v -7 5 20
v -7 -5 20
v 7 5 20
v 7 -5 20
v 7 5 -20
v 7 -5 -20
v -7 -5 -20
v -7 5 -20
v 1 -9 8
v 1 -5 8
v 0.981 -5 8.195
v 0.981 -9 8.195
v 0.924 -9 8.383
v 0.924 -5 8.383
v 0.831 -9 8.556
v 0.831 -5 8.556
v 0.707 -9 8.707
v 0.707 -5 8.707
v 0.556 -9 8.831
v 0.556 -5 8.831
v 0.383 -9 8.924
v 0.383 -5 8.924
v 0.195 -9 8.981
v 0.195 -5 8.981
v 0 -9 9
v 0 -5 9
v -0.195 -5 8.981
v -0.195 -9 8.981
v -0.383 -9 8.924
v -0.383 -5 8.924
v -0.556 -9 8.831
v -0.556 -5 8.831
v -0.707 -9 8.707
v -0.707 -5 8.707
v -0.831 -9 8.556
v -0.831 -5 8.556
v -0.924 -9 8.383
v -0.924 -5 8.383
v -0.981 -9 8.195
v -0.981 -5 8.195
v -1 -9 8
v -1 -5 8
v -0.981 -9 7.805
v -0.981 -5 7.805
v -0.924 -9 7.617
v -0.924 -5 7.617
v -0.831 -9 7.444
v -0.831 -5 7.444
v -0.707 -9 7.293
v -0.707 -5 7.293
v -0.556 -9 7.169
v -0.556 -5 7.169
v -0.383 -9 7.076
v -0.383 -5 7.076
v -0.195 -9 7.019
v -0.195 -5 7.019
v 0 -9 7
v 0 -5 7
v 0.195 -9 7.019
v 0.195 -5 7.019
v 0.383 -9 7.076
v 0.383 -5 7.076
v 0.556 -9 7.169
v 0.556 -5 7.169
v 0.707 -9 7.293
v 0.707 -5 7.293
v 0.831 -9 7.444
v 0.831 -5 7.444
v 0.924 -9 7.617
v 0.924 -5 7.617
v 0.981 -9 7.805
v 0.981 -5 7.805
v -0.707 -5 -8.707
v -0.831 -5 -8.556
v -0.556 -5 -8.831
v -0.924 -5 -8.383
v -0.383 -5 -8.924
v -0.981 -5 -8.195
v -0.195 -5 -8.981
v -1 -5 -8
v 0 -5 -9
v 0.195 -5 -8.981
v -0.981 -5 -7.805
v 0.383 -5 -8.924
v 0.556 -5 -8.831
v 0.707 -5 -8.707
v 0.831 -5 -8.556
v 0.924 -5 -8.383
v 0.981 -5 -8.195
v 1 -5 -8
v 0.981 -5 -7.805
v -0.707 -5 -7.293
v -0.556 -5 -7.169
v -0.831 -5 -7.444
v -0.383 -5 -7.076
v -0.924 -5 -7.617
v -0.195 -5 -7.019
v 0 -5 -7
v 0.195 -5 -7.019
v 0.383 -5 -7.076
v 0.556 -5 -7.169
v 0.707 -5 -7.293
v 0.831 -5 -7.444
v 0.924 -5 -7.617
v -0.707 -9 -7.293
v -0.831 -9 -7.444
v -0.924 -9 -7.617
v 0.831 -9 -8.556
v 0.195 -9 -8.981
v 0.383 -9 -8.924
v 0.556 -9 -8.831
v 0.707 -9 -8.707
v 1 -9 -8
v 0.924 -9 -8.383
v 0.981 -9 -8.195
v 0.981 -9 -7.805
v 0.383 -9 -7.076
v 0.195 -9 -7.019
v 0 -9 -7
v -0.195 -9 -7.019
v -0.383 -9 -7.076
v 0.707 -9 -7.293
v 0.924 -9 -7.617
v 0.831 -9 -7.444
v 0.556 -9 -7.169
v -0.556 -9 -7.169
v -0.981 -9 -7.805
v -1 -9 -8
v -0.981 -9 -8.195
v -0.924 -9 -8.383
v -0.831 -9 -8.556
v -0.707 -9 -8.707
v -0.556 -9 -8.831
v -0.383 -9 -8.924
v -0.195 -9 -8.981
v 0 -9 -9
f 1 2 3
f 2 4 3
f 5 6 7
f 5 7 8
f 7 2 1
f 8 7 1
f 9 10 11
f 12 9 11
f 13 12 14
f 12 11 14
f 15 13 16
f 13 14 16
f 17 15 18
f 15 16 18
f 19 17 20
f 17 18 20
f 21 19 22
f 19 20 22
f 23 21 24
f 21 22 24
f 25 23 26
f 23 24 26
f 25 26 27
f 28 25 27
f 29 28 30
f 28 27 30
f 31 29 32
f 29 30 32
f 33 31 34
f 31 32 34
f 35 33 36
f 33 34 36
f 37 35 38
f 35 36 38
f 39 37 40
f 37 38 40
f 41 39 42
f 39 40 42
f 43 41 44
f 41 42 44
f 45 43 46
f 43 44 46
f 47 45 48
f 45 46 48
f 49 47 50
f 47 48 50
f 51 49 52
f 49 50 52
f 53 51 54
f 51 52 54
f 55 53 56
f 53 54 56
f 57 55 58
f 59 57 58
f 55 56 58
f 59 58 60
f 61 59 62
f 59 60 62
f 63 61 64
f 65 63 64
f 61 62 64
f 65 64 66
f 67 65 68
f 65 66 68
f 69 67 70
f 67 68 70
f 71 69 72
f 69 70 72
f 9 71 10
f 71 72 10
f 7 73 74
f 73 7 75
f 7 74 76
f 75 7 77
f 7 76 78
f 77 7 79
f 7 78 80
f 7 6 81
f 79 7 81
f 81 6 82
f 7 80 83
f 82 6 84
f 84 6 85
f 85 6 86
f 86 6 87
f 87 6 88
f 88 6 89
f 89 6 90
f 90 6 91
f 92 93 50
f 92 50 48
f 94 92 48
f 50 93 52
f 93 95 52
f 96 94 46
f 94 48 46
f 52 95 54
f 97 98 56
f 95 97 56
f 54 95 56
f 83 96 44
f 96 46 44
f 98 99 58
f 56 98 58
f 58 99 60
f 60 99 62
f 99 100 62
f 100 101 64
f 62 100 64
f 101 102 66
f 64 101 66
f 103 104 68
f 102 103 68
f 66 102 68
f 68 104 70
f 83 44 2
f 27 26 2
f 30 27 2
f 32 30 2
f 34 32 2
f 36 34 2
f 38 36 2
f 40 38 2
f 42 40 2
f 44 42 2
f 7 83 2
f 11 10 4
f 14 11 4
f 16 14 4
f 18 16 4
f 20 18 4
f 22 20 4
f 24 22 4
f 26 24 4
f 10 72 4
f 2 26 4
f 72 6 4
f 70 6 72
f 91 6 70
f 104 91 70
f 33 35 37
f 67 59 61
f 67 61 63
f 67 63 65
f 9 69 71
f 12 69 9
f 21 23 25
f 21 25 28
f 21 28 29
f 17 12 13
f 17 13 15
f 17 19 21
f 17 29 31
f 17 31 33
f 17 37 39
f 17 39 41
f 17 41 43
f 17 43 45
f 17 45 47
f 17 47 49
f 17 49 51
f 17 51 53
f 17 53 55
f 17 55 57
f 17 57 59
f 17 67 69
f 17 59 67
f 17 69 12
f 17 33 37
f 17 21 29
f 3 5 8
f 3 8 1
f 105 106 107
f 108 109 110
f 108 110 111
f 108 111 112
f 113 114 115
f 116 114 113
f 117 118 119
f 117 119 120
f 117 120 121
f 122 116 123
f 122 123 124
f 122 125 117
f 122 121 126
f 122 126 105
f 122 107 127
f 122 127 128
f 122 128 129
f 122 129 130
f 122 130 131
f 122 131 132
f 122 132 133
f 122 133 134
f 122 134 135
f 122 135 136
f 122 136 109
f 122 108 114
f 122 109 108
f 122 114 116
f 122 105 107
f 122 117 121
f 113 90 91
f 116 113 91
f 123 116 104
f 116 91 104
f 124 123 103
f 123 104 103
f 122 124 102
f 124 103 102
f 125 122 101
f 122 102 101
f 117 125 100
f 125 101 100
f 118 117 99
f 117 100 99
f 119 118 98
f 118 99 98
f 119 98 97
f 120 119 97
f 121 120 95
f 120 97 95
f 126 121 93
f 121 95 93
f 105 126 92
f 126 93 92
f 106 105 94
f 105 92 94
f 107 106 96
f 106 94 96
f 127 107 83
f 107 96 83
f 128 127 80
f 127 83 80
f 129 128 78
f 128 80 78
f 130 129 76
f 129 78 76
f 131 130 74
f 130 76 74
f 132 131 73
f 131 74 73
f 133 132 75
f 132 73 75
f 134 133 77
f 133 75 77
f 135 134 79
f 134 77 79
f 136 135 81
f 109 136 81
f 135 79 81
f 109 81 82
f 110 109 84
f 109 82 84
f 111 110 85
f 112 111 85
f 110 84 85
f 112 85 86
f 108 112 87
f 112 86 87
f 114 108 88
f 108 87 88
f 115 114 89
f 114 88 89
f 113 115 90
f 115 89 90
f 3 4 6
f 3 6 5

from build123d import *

# Parameters (mm, degrees)
F0_W          = 10
F0_H          = 40
F1_DEPTH      = 7
F1_DEPTH_BACK = 7
F2_R          = 1
F3_DEPTH      = 4


with BuildPart() as f1:
    # F0 (on Right) → F1 (new body, two sides)
    with BuildSketch(Plane.YZ) as f1_sk:
        Rectangle(F0_W, F0_H)
    extrude(amount=F1_DEPTH)
    extrude(f1_sk.sketch, amount=-F1_DEPTH_BACK)

    # F2 (on face) → F3 (join)
    with BuildSketch(Plane.XZ.offset(5)):
        with Locations((0, 8)):
            Circle(F2_R)
        with Locations((0, -8)):
            Circle(F2_R)
    extrude(amount=F3_DEPTH)


solid = f1.part
